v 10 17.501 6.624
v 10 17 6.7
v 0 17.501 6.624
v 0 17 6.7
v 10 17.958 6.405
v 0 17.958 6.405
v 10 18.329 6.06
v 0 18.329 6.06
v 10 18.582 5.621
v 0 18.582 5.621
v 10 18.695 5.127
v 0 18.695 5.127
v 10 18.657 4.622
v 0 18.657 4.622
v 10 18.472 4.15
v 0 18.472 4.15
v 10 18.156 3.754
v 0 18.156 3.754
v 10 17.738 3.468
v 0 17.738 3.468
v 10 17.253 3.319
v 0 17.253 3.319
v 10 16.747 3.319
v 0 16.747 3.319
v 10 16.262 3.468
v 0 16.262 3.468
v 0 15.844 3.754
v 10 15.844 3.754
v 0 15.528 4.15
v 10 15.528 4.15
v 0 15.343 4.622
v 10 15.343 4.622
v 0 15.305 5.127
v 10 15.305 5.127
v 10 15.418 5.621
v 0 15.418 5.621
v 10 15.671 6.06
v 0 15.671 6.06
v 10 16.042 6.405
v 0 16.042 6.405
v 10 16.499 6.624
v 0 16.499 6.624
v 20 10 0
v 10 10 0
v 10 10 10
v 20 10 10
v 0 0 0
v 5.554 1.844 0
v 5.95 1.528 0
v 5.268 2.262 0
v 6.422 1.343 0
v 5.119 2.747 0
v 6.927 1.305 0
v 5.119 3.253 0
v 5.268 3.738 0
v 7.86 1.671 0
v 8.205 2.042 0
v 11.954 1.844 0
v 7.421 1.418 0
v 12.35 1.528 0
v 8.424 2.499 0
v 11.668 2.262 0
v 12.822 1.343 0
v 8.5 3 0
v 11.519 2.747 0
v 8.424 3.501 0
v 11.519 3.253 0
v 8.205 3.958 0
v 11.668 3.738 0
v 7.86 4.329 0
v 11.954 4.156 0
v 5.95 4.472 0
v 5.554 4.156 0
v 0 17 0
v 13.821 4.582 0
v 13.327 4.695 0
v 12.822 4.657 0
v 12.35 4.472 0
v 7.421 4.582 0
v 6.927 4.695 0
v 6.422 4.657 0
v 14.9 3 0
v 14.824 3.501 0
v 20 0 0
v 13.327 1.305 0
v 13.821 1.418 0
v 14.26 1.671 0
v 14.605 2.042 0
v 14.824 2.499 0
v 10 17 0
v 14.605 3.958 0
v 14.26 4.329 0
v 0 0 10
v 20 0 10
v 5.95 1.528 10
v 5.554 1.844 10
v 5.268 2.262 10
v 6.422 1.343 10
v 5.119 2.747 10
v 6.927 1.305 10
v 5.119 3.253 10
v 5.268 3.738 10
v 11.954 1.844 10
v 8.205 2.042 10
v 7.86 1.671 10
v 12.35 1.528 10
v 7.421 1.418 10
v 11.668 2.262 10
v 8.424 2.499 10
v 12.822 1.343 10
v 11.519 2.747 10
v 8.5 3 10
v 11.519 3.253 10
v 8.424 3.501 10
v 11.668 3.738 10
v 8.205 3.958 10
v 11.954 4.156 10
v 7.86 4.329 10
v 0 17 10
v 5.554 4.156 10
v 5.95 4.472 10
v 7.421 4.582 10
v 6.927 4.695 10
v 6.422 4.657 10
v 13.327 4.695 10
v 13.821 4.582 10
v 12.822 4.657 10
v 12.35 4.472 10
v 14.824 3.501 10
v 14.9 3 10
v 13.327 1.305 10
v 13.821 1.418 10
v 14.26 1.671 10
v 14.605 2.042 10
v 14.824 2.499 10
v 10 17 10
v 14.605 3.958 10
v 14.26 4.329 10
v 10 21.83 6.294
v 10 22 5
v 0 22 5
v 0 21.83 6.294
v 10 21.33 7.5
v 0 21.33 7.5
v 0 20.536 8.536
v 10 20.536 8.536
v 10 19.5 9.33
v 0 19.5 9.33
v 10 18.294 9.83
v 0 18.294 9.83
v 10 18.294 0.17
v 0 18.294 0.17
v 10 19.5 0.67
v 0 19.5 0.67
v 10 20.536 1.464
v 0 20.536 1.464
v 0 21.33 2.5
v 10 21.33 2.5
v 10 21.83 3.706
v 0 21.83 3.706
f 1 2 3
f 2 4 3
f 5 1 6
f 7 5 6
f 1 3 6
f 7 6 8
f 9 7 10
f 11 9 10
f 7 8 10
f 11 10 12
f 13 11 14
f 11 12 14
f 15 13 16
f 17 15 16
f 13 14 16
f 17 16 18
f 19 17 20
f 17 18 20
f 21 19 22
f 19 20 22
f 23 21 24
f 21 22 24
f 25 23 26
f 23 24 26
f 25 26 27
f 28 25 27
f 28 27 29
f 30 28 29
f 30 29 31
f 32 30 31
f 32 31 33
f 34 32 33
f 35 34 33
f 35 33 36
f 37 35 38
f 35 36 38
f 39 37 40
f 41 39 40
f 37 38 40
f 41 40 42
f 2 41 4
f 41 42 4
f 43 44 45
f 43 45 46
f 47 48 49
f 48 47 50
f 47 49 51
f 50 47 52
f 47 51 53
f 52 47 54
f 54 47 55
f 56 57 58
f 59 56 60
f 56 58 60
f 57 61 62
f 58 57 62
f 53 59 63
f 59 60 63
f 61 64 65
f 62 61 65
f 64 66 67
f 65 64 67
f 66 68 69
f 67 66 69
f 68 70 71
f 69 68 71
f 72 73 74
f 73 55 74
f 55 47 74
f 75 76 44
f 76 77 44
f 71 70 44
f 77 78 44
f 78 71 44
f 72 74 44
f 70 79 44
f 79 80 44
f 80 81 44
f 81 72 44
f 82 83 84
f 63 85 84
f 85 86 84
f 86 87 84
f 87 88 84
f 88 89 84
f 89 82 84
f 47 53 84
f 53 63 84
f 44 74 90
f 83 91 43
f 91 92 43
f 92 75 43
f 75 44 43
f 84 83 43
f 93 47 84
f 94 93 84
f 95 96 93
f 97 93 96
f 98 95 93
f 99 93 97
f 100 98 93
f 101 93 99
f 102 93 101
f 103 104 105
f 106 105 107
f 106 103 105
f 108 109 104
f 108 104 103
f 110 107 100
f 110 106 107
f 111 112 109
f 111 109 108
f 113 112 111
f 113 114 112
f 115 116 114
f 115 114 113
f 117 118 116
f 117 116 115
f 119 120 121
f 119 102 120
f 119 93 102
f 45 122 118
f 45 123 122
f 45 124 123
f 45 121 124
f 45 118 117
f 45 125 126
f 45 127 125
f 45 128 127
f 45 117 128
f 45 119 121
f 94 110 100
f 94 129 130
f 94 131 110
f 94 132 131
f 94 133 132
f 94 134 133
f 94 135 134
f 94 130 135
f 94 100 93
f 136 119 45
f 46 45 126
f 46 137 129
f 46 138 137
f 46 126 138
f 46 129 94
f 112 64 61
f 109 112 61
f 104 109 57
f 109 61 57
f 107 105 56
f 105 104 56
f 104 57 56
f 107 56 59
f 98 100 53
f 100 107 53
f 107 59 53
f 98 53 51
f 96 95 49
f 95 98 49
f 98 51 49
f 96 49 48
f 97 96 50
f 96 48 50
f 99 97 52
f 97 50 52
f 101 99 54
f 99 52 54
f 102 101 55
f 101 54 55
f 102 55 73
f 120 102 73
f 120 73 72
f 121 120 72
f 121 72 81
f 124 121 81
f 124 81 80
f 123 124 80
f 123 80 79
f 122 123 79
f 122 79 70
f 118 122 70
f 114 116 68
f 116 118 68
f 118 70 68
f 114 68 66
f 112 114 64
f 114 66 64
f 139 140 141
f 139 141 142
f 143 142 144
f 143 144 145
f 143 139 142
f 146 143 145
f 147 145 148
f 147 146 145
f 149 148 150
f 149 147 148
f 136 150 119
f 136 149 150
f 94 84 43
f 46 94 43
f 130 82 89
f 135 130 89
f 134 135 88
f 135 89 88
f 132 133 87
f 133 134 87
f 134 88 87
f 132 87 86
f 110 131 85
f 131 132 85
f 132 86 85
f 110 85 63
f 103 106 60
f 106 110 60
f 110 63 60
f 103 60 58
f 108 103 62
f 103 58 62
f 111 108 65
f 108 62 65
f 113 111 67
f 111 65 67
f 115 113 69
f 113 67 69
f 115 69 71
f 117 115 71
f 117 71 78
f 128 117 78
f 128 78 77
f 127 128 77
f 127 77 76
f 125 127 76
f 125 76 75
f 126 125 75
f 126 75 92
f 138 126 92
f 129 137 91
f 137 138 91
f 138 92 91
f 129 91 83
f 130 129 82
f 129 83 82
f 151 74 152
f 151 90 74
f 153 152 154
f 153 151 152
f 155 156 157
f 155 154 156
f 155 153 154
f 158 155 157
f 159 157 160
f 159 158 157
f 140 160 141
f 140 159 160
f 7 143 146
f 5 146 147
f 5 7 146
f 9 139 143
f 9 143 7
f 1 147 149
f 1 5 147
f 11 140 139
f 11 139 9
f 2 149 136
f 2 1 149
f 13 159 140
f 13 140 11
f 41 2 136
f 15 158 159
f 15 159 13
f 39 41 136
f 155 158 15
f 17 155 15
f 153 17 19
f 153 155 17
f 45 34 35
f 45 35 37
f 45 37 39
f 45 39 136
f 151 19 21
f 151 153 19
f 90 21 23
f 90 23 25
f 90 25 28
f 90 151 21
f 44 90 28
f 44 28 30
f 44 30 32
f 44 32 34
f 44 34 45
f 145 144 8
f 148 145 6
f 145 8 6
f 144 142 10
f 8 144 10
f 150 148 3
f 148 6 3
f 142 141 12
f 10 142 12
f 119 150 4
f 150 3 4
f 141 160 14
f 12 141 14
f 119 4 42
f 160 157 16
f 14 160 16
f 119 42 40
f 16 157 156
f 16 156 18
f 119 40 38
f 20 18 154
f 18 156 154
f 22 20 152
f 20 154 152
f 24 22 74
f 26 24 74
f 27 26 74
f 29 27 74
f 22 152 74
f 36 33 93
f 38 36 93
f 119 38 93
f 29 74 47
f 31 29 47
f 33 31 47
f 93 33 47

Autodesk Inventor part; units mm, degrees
ref_plane "YZ Plane" through (0, 0, 0) normal (1, 0, 0) x (0, 1, 0)
ref_plane "XZ Plane" through (0, 0, 0) normal (0, 1, 0) x (-1, 0, 0)
ref_plane "XY Plane" through (0, 0, 0) normal (0, 0, 1) x (1, 0, 0)
sketch "スケッチ4" plane through (0, 0, 0) normal (0, 0, 1) x (1, 0, 0)
  line L0 (0, 0) -> (20, 0)
  line L1 (20, 0) -> (20, 10)
  line L2 (0, 22) -> (0, 0)
  line L3 (0, 22) -> (10, 22)
  line L4 (10, 22) -> (10, 10)
  line L5 (10, 10) -> (20, 10)
  line L6 (10, 0) -> (10, 7.8024) construction
  circle A0 centre (6.8, 3) radius 1.7
  circle A1 centre (13.2, 3) radius 1.7
  dimension "d19" = 20
  dimension "d20" = 22
  dimension "d21" = 12
  dimension "d22" = 10
  dimension "d23" = 6.4
  dimension "d24" = 3.4
  dimension "d25" = 3
extrude "押し出し4" add sketch "スケッチ4" along normal blind 10
sketch "スケッチ5" plane through (0, 0, 0) normal (-1, 0, 0) x (0, 0, 1)
  line L0 (0, 22) -> (10, 22) projected
  line L1 (5, 22) -> (5, 17) construction
  circle A0 centre (5, 17) radius 1.7
  point P0 (0, 0)
  dimension "d28" = 3.4
  dimension "d29" = 5
extrude "押し出し5" cut sketch "スケッチ5" against normal blind 10
fillet "フィレット2" radius 5 2 edges at (5, 22, 0) (5, 22, 10)
properties part number "pixymount1"
